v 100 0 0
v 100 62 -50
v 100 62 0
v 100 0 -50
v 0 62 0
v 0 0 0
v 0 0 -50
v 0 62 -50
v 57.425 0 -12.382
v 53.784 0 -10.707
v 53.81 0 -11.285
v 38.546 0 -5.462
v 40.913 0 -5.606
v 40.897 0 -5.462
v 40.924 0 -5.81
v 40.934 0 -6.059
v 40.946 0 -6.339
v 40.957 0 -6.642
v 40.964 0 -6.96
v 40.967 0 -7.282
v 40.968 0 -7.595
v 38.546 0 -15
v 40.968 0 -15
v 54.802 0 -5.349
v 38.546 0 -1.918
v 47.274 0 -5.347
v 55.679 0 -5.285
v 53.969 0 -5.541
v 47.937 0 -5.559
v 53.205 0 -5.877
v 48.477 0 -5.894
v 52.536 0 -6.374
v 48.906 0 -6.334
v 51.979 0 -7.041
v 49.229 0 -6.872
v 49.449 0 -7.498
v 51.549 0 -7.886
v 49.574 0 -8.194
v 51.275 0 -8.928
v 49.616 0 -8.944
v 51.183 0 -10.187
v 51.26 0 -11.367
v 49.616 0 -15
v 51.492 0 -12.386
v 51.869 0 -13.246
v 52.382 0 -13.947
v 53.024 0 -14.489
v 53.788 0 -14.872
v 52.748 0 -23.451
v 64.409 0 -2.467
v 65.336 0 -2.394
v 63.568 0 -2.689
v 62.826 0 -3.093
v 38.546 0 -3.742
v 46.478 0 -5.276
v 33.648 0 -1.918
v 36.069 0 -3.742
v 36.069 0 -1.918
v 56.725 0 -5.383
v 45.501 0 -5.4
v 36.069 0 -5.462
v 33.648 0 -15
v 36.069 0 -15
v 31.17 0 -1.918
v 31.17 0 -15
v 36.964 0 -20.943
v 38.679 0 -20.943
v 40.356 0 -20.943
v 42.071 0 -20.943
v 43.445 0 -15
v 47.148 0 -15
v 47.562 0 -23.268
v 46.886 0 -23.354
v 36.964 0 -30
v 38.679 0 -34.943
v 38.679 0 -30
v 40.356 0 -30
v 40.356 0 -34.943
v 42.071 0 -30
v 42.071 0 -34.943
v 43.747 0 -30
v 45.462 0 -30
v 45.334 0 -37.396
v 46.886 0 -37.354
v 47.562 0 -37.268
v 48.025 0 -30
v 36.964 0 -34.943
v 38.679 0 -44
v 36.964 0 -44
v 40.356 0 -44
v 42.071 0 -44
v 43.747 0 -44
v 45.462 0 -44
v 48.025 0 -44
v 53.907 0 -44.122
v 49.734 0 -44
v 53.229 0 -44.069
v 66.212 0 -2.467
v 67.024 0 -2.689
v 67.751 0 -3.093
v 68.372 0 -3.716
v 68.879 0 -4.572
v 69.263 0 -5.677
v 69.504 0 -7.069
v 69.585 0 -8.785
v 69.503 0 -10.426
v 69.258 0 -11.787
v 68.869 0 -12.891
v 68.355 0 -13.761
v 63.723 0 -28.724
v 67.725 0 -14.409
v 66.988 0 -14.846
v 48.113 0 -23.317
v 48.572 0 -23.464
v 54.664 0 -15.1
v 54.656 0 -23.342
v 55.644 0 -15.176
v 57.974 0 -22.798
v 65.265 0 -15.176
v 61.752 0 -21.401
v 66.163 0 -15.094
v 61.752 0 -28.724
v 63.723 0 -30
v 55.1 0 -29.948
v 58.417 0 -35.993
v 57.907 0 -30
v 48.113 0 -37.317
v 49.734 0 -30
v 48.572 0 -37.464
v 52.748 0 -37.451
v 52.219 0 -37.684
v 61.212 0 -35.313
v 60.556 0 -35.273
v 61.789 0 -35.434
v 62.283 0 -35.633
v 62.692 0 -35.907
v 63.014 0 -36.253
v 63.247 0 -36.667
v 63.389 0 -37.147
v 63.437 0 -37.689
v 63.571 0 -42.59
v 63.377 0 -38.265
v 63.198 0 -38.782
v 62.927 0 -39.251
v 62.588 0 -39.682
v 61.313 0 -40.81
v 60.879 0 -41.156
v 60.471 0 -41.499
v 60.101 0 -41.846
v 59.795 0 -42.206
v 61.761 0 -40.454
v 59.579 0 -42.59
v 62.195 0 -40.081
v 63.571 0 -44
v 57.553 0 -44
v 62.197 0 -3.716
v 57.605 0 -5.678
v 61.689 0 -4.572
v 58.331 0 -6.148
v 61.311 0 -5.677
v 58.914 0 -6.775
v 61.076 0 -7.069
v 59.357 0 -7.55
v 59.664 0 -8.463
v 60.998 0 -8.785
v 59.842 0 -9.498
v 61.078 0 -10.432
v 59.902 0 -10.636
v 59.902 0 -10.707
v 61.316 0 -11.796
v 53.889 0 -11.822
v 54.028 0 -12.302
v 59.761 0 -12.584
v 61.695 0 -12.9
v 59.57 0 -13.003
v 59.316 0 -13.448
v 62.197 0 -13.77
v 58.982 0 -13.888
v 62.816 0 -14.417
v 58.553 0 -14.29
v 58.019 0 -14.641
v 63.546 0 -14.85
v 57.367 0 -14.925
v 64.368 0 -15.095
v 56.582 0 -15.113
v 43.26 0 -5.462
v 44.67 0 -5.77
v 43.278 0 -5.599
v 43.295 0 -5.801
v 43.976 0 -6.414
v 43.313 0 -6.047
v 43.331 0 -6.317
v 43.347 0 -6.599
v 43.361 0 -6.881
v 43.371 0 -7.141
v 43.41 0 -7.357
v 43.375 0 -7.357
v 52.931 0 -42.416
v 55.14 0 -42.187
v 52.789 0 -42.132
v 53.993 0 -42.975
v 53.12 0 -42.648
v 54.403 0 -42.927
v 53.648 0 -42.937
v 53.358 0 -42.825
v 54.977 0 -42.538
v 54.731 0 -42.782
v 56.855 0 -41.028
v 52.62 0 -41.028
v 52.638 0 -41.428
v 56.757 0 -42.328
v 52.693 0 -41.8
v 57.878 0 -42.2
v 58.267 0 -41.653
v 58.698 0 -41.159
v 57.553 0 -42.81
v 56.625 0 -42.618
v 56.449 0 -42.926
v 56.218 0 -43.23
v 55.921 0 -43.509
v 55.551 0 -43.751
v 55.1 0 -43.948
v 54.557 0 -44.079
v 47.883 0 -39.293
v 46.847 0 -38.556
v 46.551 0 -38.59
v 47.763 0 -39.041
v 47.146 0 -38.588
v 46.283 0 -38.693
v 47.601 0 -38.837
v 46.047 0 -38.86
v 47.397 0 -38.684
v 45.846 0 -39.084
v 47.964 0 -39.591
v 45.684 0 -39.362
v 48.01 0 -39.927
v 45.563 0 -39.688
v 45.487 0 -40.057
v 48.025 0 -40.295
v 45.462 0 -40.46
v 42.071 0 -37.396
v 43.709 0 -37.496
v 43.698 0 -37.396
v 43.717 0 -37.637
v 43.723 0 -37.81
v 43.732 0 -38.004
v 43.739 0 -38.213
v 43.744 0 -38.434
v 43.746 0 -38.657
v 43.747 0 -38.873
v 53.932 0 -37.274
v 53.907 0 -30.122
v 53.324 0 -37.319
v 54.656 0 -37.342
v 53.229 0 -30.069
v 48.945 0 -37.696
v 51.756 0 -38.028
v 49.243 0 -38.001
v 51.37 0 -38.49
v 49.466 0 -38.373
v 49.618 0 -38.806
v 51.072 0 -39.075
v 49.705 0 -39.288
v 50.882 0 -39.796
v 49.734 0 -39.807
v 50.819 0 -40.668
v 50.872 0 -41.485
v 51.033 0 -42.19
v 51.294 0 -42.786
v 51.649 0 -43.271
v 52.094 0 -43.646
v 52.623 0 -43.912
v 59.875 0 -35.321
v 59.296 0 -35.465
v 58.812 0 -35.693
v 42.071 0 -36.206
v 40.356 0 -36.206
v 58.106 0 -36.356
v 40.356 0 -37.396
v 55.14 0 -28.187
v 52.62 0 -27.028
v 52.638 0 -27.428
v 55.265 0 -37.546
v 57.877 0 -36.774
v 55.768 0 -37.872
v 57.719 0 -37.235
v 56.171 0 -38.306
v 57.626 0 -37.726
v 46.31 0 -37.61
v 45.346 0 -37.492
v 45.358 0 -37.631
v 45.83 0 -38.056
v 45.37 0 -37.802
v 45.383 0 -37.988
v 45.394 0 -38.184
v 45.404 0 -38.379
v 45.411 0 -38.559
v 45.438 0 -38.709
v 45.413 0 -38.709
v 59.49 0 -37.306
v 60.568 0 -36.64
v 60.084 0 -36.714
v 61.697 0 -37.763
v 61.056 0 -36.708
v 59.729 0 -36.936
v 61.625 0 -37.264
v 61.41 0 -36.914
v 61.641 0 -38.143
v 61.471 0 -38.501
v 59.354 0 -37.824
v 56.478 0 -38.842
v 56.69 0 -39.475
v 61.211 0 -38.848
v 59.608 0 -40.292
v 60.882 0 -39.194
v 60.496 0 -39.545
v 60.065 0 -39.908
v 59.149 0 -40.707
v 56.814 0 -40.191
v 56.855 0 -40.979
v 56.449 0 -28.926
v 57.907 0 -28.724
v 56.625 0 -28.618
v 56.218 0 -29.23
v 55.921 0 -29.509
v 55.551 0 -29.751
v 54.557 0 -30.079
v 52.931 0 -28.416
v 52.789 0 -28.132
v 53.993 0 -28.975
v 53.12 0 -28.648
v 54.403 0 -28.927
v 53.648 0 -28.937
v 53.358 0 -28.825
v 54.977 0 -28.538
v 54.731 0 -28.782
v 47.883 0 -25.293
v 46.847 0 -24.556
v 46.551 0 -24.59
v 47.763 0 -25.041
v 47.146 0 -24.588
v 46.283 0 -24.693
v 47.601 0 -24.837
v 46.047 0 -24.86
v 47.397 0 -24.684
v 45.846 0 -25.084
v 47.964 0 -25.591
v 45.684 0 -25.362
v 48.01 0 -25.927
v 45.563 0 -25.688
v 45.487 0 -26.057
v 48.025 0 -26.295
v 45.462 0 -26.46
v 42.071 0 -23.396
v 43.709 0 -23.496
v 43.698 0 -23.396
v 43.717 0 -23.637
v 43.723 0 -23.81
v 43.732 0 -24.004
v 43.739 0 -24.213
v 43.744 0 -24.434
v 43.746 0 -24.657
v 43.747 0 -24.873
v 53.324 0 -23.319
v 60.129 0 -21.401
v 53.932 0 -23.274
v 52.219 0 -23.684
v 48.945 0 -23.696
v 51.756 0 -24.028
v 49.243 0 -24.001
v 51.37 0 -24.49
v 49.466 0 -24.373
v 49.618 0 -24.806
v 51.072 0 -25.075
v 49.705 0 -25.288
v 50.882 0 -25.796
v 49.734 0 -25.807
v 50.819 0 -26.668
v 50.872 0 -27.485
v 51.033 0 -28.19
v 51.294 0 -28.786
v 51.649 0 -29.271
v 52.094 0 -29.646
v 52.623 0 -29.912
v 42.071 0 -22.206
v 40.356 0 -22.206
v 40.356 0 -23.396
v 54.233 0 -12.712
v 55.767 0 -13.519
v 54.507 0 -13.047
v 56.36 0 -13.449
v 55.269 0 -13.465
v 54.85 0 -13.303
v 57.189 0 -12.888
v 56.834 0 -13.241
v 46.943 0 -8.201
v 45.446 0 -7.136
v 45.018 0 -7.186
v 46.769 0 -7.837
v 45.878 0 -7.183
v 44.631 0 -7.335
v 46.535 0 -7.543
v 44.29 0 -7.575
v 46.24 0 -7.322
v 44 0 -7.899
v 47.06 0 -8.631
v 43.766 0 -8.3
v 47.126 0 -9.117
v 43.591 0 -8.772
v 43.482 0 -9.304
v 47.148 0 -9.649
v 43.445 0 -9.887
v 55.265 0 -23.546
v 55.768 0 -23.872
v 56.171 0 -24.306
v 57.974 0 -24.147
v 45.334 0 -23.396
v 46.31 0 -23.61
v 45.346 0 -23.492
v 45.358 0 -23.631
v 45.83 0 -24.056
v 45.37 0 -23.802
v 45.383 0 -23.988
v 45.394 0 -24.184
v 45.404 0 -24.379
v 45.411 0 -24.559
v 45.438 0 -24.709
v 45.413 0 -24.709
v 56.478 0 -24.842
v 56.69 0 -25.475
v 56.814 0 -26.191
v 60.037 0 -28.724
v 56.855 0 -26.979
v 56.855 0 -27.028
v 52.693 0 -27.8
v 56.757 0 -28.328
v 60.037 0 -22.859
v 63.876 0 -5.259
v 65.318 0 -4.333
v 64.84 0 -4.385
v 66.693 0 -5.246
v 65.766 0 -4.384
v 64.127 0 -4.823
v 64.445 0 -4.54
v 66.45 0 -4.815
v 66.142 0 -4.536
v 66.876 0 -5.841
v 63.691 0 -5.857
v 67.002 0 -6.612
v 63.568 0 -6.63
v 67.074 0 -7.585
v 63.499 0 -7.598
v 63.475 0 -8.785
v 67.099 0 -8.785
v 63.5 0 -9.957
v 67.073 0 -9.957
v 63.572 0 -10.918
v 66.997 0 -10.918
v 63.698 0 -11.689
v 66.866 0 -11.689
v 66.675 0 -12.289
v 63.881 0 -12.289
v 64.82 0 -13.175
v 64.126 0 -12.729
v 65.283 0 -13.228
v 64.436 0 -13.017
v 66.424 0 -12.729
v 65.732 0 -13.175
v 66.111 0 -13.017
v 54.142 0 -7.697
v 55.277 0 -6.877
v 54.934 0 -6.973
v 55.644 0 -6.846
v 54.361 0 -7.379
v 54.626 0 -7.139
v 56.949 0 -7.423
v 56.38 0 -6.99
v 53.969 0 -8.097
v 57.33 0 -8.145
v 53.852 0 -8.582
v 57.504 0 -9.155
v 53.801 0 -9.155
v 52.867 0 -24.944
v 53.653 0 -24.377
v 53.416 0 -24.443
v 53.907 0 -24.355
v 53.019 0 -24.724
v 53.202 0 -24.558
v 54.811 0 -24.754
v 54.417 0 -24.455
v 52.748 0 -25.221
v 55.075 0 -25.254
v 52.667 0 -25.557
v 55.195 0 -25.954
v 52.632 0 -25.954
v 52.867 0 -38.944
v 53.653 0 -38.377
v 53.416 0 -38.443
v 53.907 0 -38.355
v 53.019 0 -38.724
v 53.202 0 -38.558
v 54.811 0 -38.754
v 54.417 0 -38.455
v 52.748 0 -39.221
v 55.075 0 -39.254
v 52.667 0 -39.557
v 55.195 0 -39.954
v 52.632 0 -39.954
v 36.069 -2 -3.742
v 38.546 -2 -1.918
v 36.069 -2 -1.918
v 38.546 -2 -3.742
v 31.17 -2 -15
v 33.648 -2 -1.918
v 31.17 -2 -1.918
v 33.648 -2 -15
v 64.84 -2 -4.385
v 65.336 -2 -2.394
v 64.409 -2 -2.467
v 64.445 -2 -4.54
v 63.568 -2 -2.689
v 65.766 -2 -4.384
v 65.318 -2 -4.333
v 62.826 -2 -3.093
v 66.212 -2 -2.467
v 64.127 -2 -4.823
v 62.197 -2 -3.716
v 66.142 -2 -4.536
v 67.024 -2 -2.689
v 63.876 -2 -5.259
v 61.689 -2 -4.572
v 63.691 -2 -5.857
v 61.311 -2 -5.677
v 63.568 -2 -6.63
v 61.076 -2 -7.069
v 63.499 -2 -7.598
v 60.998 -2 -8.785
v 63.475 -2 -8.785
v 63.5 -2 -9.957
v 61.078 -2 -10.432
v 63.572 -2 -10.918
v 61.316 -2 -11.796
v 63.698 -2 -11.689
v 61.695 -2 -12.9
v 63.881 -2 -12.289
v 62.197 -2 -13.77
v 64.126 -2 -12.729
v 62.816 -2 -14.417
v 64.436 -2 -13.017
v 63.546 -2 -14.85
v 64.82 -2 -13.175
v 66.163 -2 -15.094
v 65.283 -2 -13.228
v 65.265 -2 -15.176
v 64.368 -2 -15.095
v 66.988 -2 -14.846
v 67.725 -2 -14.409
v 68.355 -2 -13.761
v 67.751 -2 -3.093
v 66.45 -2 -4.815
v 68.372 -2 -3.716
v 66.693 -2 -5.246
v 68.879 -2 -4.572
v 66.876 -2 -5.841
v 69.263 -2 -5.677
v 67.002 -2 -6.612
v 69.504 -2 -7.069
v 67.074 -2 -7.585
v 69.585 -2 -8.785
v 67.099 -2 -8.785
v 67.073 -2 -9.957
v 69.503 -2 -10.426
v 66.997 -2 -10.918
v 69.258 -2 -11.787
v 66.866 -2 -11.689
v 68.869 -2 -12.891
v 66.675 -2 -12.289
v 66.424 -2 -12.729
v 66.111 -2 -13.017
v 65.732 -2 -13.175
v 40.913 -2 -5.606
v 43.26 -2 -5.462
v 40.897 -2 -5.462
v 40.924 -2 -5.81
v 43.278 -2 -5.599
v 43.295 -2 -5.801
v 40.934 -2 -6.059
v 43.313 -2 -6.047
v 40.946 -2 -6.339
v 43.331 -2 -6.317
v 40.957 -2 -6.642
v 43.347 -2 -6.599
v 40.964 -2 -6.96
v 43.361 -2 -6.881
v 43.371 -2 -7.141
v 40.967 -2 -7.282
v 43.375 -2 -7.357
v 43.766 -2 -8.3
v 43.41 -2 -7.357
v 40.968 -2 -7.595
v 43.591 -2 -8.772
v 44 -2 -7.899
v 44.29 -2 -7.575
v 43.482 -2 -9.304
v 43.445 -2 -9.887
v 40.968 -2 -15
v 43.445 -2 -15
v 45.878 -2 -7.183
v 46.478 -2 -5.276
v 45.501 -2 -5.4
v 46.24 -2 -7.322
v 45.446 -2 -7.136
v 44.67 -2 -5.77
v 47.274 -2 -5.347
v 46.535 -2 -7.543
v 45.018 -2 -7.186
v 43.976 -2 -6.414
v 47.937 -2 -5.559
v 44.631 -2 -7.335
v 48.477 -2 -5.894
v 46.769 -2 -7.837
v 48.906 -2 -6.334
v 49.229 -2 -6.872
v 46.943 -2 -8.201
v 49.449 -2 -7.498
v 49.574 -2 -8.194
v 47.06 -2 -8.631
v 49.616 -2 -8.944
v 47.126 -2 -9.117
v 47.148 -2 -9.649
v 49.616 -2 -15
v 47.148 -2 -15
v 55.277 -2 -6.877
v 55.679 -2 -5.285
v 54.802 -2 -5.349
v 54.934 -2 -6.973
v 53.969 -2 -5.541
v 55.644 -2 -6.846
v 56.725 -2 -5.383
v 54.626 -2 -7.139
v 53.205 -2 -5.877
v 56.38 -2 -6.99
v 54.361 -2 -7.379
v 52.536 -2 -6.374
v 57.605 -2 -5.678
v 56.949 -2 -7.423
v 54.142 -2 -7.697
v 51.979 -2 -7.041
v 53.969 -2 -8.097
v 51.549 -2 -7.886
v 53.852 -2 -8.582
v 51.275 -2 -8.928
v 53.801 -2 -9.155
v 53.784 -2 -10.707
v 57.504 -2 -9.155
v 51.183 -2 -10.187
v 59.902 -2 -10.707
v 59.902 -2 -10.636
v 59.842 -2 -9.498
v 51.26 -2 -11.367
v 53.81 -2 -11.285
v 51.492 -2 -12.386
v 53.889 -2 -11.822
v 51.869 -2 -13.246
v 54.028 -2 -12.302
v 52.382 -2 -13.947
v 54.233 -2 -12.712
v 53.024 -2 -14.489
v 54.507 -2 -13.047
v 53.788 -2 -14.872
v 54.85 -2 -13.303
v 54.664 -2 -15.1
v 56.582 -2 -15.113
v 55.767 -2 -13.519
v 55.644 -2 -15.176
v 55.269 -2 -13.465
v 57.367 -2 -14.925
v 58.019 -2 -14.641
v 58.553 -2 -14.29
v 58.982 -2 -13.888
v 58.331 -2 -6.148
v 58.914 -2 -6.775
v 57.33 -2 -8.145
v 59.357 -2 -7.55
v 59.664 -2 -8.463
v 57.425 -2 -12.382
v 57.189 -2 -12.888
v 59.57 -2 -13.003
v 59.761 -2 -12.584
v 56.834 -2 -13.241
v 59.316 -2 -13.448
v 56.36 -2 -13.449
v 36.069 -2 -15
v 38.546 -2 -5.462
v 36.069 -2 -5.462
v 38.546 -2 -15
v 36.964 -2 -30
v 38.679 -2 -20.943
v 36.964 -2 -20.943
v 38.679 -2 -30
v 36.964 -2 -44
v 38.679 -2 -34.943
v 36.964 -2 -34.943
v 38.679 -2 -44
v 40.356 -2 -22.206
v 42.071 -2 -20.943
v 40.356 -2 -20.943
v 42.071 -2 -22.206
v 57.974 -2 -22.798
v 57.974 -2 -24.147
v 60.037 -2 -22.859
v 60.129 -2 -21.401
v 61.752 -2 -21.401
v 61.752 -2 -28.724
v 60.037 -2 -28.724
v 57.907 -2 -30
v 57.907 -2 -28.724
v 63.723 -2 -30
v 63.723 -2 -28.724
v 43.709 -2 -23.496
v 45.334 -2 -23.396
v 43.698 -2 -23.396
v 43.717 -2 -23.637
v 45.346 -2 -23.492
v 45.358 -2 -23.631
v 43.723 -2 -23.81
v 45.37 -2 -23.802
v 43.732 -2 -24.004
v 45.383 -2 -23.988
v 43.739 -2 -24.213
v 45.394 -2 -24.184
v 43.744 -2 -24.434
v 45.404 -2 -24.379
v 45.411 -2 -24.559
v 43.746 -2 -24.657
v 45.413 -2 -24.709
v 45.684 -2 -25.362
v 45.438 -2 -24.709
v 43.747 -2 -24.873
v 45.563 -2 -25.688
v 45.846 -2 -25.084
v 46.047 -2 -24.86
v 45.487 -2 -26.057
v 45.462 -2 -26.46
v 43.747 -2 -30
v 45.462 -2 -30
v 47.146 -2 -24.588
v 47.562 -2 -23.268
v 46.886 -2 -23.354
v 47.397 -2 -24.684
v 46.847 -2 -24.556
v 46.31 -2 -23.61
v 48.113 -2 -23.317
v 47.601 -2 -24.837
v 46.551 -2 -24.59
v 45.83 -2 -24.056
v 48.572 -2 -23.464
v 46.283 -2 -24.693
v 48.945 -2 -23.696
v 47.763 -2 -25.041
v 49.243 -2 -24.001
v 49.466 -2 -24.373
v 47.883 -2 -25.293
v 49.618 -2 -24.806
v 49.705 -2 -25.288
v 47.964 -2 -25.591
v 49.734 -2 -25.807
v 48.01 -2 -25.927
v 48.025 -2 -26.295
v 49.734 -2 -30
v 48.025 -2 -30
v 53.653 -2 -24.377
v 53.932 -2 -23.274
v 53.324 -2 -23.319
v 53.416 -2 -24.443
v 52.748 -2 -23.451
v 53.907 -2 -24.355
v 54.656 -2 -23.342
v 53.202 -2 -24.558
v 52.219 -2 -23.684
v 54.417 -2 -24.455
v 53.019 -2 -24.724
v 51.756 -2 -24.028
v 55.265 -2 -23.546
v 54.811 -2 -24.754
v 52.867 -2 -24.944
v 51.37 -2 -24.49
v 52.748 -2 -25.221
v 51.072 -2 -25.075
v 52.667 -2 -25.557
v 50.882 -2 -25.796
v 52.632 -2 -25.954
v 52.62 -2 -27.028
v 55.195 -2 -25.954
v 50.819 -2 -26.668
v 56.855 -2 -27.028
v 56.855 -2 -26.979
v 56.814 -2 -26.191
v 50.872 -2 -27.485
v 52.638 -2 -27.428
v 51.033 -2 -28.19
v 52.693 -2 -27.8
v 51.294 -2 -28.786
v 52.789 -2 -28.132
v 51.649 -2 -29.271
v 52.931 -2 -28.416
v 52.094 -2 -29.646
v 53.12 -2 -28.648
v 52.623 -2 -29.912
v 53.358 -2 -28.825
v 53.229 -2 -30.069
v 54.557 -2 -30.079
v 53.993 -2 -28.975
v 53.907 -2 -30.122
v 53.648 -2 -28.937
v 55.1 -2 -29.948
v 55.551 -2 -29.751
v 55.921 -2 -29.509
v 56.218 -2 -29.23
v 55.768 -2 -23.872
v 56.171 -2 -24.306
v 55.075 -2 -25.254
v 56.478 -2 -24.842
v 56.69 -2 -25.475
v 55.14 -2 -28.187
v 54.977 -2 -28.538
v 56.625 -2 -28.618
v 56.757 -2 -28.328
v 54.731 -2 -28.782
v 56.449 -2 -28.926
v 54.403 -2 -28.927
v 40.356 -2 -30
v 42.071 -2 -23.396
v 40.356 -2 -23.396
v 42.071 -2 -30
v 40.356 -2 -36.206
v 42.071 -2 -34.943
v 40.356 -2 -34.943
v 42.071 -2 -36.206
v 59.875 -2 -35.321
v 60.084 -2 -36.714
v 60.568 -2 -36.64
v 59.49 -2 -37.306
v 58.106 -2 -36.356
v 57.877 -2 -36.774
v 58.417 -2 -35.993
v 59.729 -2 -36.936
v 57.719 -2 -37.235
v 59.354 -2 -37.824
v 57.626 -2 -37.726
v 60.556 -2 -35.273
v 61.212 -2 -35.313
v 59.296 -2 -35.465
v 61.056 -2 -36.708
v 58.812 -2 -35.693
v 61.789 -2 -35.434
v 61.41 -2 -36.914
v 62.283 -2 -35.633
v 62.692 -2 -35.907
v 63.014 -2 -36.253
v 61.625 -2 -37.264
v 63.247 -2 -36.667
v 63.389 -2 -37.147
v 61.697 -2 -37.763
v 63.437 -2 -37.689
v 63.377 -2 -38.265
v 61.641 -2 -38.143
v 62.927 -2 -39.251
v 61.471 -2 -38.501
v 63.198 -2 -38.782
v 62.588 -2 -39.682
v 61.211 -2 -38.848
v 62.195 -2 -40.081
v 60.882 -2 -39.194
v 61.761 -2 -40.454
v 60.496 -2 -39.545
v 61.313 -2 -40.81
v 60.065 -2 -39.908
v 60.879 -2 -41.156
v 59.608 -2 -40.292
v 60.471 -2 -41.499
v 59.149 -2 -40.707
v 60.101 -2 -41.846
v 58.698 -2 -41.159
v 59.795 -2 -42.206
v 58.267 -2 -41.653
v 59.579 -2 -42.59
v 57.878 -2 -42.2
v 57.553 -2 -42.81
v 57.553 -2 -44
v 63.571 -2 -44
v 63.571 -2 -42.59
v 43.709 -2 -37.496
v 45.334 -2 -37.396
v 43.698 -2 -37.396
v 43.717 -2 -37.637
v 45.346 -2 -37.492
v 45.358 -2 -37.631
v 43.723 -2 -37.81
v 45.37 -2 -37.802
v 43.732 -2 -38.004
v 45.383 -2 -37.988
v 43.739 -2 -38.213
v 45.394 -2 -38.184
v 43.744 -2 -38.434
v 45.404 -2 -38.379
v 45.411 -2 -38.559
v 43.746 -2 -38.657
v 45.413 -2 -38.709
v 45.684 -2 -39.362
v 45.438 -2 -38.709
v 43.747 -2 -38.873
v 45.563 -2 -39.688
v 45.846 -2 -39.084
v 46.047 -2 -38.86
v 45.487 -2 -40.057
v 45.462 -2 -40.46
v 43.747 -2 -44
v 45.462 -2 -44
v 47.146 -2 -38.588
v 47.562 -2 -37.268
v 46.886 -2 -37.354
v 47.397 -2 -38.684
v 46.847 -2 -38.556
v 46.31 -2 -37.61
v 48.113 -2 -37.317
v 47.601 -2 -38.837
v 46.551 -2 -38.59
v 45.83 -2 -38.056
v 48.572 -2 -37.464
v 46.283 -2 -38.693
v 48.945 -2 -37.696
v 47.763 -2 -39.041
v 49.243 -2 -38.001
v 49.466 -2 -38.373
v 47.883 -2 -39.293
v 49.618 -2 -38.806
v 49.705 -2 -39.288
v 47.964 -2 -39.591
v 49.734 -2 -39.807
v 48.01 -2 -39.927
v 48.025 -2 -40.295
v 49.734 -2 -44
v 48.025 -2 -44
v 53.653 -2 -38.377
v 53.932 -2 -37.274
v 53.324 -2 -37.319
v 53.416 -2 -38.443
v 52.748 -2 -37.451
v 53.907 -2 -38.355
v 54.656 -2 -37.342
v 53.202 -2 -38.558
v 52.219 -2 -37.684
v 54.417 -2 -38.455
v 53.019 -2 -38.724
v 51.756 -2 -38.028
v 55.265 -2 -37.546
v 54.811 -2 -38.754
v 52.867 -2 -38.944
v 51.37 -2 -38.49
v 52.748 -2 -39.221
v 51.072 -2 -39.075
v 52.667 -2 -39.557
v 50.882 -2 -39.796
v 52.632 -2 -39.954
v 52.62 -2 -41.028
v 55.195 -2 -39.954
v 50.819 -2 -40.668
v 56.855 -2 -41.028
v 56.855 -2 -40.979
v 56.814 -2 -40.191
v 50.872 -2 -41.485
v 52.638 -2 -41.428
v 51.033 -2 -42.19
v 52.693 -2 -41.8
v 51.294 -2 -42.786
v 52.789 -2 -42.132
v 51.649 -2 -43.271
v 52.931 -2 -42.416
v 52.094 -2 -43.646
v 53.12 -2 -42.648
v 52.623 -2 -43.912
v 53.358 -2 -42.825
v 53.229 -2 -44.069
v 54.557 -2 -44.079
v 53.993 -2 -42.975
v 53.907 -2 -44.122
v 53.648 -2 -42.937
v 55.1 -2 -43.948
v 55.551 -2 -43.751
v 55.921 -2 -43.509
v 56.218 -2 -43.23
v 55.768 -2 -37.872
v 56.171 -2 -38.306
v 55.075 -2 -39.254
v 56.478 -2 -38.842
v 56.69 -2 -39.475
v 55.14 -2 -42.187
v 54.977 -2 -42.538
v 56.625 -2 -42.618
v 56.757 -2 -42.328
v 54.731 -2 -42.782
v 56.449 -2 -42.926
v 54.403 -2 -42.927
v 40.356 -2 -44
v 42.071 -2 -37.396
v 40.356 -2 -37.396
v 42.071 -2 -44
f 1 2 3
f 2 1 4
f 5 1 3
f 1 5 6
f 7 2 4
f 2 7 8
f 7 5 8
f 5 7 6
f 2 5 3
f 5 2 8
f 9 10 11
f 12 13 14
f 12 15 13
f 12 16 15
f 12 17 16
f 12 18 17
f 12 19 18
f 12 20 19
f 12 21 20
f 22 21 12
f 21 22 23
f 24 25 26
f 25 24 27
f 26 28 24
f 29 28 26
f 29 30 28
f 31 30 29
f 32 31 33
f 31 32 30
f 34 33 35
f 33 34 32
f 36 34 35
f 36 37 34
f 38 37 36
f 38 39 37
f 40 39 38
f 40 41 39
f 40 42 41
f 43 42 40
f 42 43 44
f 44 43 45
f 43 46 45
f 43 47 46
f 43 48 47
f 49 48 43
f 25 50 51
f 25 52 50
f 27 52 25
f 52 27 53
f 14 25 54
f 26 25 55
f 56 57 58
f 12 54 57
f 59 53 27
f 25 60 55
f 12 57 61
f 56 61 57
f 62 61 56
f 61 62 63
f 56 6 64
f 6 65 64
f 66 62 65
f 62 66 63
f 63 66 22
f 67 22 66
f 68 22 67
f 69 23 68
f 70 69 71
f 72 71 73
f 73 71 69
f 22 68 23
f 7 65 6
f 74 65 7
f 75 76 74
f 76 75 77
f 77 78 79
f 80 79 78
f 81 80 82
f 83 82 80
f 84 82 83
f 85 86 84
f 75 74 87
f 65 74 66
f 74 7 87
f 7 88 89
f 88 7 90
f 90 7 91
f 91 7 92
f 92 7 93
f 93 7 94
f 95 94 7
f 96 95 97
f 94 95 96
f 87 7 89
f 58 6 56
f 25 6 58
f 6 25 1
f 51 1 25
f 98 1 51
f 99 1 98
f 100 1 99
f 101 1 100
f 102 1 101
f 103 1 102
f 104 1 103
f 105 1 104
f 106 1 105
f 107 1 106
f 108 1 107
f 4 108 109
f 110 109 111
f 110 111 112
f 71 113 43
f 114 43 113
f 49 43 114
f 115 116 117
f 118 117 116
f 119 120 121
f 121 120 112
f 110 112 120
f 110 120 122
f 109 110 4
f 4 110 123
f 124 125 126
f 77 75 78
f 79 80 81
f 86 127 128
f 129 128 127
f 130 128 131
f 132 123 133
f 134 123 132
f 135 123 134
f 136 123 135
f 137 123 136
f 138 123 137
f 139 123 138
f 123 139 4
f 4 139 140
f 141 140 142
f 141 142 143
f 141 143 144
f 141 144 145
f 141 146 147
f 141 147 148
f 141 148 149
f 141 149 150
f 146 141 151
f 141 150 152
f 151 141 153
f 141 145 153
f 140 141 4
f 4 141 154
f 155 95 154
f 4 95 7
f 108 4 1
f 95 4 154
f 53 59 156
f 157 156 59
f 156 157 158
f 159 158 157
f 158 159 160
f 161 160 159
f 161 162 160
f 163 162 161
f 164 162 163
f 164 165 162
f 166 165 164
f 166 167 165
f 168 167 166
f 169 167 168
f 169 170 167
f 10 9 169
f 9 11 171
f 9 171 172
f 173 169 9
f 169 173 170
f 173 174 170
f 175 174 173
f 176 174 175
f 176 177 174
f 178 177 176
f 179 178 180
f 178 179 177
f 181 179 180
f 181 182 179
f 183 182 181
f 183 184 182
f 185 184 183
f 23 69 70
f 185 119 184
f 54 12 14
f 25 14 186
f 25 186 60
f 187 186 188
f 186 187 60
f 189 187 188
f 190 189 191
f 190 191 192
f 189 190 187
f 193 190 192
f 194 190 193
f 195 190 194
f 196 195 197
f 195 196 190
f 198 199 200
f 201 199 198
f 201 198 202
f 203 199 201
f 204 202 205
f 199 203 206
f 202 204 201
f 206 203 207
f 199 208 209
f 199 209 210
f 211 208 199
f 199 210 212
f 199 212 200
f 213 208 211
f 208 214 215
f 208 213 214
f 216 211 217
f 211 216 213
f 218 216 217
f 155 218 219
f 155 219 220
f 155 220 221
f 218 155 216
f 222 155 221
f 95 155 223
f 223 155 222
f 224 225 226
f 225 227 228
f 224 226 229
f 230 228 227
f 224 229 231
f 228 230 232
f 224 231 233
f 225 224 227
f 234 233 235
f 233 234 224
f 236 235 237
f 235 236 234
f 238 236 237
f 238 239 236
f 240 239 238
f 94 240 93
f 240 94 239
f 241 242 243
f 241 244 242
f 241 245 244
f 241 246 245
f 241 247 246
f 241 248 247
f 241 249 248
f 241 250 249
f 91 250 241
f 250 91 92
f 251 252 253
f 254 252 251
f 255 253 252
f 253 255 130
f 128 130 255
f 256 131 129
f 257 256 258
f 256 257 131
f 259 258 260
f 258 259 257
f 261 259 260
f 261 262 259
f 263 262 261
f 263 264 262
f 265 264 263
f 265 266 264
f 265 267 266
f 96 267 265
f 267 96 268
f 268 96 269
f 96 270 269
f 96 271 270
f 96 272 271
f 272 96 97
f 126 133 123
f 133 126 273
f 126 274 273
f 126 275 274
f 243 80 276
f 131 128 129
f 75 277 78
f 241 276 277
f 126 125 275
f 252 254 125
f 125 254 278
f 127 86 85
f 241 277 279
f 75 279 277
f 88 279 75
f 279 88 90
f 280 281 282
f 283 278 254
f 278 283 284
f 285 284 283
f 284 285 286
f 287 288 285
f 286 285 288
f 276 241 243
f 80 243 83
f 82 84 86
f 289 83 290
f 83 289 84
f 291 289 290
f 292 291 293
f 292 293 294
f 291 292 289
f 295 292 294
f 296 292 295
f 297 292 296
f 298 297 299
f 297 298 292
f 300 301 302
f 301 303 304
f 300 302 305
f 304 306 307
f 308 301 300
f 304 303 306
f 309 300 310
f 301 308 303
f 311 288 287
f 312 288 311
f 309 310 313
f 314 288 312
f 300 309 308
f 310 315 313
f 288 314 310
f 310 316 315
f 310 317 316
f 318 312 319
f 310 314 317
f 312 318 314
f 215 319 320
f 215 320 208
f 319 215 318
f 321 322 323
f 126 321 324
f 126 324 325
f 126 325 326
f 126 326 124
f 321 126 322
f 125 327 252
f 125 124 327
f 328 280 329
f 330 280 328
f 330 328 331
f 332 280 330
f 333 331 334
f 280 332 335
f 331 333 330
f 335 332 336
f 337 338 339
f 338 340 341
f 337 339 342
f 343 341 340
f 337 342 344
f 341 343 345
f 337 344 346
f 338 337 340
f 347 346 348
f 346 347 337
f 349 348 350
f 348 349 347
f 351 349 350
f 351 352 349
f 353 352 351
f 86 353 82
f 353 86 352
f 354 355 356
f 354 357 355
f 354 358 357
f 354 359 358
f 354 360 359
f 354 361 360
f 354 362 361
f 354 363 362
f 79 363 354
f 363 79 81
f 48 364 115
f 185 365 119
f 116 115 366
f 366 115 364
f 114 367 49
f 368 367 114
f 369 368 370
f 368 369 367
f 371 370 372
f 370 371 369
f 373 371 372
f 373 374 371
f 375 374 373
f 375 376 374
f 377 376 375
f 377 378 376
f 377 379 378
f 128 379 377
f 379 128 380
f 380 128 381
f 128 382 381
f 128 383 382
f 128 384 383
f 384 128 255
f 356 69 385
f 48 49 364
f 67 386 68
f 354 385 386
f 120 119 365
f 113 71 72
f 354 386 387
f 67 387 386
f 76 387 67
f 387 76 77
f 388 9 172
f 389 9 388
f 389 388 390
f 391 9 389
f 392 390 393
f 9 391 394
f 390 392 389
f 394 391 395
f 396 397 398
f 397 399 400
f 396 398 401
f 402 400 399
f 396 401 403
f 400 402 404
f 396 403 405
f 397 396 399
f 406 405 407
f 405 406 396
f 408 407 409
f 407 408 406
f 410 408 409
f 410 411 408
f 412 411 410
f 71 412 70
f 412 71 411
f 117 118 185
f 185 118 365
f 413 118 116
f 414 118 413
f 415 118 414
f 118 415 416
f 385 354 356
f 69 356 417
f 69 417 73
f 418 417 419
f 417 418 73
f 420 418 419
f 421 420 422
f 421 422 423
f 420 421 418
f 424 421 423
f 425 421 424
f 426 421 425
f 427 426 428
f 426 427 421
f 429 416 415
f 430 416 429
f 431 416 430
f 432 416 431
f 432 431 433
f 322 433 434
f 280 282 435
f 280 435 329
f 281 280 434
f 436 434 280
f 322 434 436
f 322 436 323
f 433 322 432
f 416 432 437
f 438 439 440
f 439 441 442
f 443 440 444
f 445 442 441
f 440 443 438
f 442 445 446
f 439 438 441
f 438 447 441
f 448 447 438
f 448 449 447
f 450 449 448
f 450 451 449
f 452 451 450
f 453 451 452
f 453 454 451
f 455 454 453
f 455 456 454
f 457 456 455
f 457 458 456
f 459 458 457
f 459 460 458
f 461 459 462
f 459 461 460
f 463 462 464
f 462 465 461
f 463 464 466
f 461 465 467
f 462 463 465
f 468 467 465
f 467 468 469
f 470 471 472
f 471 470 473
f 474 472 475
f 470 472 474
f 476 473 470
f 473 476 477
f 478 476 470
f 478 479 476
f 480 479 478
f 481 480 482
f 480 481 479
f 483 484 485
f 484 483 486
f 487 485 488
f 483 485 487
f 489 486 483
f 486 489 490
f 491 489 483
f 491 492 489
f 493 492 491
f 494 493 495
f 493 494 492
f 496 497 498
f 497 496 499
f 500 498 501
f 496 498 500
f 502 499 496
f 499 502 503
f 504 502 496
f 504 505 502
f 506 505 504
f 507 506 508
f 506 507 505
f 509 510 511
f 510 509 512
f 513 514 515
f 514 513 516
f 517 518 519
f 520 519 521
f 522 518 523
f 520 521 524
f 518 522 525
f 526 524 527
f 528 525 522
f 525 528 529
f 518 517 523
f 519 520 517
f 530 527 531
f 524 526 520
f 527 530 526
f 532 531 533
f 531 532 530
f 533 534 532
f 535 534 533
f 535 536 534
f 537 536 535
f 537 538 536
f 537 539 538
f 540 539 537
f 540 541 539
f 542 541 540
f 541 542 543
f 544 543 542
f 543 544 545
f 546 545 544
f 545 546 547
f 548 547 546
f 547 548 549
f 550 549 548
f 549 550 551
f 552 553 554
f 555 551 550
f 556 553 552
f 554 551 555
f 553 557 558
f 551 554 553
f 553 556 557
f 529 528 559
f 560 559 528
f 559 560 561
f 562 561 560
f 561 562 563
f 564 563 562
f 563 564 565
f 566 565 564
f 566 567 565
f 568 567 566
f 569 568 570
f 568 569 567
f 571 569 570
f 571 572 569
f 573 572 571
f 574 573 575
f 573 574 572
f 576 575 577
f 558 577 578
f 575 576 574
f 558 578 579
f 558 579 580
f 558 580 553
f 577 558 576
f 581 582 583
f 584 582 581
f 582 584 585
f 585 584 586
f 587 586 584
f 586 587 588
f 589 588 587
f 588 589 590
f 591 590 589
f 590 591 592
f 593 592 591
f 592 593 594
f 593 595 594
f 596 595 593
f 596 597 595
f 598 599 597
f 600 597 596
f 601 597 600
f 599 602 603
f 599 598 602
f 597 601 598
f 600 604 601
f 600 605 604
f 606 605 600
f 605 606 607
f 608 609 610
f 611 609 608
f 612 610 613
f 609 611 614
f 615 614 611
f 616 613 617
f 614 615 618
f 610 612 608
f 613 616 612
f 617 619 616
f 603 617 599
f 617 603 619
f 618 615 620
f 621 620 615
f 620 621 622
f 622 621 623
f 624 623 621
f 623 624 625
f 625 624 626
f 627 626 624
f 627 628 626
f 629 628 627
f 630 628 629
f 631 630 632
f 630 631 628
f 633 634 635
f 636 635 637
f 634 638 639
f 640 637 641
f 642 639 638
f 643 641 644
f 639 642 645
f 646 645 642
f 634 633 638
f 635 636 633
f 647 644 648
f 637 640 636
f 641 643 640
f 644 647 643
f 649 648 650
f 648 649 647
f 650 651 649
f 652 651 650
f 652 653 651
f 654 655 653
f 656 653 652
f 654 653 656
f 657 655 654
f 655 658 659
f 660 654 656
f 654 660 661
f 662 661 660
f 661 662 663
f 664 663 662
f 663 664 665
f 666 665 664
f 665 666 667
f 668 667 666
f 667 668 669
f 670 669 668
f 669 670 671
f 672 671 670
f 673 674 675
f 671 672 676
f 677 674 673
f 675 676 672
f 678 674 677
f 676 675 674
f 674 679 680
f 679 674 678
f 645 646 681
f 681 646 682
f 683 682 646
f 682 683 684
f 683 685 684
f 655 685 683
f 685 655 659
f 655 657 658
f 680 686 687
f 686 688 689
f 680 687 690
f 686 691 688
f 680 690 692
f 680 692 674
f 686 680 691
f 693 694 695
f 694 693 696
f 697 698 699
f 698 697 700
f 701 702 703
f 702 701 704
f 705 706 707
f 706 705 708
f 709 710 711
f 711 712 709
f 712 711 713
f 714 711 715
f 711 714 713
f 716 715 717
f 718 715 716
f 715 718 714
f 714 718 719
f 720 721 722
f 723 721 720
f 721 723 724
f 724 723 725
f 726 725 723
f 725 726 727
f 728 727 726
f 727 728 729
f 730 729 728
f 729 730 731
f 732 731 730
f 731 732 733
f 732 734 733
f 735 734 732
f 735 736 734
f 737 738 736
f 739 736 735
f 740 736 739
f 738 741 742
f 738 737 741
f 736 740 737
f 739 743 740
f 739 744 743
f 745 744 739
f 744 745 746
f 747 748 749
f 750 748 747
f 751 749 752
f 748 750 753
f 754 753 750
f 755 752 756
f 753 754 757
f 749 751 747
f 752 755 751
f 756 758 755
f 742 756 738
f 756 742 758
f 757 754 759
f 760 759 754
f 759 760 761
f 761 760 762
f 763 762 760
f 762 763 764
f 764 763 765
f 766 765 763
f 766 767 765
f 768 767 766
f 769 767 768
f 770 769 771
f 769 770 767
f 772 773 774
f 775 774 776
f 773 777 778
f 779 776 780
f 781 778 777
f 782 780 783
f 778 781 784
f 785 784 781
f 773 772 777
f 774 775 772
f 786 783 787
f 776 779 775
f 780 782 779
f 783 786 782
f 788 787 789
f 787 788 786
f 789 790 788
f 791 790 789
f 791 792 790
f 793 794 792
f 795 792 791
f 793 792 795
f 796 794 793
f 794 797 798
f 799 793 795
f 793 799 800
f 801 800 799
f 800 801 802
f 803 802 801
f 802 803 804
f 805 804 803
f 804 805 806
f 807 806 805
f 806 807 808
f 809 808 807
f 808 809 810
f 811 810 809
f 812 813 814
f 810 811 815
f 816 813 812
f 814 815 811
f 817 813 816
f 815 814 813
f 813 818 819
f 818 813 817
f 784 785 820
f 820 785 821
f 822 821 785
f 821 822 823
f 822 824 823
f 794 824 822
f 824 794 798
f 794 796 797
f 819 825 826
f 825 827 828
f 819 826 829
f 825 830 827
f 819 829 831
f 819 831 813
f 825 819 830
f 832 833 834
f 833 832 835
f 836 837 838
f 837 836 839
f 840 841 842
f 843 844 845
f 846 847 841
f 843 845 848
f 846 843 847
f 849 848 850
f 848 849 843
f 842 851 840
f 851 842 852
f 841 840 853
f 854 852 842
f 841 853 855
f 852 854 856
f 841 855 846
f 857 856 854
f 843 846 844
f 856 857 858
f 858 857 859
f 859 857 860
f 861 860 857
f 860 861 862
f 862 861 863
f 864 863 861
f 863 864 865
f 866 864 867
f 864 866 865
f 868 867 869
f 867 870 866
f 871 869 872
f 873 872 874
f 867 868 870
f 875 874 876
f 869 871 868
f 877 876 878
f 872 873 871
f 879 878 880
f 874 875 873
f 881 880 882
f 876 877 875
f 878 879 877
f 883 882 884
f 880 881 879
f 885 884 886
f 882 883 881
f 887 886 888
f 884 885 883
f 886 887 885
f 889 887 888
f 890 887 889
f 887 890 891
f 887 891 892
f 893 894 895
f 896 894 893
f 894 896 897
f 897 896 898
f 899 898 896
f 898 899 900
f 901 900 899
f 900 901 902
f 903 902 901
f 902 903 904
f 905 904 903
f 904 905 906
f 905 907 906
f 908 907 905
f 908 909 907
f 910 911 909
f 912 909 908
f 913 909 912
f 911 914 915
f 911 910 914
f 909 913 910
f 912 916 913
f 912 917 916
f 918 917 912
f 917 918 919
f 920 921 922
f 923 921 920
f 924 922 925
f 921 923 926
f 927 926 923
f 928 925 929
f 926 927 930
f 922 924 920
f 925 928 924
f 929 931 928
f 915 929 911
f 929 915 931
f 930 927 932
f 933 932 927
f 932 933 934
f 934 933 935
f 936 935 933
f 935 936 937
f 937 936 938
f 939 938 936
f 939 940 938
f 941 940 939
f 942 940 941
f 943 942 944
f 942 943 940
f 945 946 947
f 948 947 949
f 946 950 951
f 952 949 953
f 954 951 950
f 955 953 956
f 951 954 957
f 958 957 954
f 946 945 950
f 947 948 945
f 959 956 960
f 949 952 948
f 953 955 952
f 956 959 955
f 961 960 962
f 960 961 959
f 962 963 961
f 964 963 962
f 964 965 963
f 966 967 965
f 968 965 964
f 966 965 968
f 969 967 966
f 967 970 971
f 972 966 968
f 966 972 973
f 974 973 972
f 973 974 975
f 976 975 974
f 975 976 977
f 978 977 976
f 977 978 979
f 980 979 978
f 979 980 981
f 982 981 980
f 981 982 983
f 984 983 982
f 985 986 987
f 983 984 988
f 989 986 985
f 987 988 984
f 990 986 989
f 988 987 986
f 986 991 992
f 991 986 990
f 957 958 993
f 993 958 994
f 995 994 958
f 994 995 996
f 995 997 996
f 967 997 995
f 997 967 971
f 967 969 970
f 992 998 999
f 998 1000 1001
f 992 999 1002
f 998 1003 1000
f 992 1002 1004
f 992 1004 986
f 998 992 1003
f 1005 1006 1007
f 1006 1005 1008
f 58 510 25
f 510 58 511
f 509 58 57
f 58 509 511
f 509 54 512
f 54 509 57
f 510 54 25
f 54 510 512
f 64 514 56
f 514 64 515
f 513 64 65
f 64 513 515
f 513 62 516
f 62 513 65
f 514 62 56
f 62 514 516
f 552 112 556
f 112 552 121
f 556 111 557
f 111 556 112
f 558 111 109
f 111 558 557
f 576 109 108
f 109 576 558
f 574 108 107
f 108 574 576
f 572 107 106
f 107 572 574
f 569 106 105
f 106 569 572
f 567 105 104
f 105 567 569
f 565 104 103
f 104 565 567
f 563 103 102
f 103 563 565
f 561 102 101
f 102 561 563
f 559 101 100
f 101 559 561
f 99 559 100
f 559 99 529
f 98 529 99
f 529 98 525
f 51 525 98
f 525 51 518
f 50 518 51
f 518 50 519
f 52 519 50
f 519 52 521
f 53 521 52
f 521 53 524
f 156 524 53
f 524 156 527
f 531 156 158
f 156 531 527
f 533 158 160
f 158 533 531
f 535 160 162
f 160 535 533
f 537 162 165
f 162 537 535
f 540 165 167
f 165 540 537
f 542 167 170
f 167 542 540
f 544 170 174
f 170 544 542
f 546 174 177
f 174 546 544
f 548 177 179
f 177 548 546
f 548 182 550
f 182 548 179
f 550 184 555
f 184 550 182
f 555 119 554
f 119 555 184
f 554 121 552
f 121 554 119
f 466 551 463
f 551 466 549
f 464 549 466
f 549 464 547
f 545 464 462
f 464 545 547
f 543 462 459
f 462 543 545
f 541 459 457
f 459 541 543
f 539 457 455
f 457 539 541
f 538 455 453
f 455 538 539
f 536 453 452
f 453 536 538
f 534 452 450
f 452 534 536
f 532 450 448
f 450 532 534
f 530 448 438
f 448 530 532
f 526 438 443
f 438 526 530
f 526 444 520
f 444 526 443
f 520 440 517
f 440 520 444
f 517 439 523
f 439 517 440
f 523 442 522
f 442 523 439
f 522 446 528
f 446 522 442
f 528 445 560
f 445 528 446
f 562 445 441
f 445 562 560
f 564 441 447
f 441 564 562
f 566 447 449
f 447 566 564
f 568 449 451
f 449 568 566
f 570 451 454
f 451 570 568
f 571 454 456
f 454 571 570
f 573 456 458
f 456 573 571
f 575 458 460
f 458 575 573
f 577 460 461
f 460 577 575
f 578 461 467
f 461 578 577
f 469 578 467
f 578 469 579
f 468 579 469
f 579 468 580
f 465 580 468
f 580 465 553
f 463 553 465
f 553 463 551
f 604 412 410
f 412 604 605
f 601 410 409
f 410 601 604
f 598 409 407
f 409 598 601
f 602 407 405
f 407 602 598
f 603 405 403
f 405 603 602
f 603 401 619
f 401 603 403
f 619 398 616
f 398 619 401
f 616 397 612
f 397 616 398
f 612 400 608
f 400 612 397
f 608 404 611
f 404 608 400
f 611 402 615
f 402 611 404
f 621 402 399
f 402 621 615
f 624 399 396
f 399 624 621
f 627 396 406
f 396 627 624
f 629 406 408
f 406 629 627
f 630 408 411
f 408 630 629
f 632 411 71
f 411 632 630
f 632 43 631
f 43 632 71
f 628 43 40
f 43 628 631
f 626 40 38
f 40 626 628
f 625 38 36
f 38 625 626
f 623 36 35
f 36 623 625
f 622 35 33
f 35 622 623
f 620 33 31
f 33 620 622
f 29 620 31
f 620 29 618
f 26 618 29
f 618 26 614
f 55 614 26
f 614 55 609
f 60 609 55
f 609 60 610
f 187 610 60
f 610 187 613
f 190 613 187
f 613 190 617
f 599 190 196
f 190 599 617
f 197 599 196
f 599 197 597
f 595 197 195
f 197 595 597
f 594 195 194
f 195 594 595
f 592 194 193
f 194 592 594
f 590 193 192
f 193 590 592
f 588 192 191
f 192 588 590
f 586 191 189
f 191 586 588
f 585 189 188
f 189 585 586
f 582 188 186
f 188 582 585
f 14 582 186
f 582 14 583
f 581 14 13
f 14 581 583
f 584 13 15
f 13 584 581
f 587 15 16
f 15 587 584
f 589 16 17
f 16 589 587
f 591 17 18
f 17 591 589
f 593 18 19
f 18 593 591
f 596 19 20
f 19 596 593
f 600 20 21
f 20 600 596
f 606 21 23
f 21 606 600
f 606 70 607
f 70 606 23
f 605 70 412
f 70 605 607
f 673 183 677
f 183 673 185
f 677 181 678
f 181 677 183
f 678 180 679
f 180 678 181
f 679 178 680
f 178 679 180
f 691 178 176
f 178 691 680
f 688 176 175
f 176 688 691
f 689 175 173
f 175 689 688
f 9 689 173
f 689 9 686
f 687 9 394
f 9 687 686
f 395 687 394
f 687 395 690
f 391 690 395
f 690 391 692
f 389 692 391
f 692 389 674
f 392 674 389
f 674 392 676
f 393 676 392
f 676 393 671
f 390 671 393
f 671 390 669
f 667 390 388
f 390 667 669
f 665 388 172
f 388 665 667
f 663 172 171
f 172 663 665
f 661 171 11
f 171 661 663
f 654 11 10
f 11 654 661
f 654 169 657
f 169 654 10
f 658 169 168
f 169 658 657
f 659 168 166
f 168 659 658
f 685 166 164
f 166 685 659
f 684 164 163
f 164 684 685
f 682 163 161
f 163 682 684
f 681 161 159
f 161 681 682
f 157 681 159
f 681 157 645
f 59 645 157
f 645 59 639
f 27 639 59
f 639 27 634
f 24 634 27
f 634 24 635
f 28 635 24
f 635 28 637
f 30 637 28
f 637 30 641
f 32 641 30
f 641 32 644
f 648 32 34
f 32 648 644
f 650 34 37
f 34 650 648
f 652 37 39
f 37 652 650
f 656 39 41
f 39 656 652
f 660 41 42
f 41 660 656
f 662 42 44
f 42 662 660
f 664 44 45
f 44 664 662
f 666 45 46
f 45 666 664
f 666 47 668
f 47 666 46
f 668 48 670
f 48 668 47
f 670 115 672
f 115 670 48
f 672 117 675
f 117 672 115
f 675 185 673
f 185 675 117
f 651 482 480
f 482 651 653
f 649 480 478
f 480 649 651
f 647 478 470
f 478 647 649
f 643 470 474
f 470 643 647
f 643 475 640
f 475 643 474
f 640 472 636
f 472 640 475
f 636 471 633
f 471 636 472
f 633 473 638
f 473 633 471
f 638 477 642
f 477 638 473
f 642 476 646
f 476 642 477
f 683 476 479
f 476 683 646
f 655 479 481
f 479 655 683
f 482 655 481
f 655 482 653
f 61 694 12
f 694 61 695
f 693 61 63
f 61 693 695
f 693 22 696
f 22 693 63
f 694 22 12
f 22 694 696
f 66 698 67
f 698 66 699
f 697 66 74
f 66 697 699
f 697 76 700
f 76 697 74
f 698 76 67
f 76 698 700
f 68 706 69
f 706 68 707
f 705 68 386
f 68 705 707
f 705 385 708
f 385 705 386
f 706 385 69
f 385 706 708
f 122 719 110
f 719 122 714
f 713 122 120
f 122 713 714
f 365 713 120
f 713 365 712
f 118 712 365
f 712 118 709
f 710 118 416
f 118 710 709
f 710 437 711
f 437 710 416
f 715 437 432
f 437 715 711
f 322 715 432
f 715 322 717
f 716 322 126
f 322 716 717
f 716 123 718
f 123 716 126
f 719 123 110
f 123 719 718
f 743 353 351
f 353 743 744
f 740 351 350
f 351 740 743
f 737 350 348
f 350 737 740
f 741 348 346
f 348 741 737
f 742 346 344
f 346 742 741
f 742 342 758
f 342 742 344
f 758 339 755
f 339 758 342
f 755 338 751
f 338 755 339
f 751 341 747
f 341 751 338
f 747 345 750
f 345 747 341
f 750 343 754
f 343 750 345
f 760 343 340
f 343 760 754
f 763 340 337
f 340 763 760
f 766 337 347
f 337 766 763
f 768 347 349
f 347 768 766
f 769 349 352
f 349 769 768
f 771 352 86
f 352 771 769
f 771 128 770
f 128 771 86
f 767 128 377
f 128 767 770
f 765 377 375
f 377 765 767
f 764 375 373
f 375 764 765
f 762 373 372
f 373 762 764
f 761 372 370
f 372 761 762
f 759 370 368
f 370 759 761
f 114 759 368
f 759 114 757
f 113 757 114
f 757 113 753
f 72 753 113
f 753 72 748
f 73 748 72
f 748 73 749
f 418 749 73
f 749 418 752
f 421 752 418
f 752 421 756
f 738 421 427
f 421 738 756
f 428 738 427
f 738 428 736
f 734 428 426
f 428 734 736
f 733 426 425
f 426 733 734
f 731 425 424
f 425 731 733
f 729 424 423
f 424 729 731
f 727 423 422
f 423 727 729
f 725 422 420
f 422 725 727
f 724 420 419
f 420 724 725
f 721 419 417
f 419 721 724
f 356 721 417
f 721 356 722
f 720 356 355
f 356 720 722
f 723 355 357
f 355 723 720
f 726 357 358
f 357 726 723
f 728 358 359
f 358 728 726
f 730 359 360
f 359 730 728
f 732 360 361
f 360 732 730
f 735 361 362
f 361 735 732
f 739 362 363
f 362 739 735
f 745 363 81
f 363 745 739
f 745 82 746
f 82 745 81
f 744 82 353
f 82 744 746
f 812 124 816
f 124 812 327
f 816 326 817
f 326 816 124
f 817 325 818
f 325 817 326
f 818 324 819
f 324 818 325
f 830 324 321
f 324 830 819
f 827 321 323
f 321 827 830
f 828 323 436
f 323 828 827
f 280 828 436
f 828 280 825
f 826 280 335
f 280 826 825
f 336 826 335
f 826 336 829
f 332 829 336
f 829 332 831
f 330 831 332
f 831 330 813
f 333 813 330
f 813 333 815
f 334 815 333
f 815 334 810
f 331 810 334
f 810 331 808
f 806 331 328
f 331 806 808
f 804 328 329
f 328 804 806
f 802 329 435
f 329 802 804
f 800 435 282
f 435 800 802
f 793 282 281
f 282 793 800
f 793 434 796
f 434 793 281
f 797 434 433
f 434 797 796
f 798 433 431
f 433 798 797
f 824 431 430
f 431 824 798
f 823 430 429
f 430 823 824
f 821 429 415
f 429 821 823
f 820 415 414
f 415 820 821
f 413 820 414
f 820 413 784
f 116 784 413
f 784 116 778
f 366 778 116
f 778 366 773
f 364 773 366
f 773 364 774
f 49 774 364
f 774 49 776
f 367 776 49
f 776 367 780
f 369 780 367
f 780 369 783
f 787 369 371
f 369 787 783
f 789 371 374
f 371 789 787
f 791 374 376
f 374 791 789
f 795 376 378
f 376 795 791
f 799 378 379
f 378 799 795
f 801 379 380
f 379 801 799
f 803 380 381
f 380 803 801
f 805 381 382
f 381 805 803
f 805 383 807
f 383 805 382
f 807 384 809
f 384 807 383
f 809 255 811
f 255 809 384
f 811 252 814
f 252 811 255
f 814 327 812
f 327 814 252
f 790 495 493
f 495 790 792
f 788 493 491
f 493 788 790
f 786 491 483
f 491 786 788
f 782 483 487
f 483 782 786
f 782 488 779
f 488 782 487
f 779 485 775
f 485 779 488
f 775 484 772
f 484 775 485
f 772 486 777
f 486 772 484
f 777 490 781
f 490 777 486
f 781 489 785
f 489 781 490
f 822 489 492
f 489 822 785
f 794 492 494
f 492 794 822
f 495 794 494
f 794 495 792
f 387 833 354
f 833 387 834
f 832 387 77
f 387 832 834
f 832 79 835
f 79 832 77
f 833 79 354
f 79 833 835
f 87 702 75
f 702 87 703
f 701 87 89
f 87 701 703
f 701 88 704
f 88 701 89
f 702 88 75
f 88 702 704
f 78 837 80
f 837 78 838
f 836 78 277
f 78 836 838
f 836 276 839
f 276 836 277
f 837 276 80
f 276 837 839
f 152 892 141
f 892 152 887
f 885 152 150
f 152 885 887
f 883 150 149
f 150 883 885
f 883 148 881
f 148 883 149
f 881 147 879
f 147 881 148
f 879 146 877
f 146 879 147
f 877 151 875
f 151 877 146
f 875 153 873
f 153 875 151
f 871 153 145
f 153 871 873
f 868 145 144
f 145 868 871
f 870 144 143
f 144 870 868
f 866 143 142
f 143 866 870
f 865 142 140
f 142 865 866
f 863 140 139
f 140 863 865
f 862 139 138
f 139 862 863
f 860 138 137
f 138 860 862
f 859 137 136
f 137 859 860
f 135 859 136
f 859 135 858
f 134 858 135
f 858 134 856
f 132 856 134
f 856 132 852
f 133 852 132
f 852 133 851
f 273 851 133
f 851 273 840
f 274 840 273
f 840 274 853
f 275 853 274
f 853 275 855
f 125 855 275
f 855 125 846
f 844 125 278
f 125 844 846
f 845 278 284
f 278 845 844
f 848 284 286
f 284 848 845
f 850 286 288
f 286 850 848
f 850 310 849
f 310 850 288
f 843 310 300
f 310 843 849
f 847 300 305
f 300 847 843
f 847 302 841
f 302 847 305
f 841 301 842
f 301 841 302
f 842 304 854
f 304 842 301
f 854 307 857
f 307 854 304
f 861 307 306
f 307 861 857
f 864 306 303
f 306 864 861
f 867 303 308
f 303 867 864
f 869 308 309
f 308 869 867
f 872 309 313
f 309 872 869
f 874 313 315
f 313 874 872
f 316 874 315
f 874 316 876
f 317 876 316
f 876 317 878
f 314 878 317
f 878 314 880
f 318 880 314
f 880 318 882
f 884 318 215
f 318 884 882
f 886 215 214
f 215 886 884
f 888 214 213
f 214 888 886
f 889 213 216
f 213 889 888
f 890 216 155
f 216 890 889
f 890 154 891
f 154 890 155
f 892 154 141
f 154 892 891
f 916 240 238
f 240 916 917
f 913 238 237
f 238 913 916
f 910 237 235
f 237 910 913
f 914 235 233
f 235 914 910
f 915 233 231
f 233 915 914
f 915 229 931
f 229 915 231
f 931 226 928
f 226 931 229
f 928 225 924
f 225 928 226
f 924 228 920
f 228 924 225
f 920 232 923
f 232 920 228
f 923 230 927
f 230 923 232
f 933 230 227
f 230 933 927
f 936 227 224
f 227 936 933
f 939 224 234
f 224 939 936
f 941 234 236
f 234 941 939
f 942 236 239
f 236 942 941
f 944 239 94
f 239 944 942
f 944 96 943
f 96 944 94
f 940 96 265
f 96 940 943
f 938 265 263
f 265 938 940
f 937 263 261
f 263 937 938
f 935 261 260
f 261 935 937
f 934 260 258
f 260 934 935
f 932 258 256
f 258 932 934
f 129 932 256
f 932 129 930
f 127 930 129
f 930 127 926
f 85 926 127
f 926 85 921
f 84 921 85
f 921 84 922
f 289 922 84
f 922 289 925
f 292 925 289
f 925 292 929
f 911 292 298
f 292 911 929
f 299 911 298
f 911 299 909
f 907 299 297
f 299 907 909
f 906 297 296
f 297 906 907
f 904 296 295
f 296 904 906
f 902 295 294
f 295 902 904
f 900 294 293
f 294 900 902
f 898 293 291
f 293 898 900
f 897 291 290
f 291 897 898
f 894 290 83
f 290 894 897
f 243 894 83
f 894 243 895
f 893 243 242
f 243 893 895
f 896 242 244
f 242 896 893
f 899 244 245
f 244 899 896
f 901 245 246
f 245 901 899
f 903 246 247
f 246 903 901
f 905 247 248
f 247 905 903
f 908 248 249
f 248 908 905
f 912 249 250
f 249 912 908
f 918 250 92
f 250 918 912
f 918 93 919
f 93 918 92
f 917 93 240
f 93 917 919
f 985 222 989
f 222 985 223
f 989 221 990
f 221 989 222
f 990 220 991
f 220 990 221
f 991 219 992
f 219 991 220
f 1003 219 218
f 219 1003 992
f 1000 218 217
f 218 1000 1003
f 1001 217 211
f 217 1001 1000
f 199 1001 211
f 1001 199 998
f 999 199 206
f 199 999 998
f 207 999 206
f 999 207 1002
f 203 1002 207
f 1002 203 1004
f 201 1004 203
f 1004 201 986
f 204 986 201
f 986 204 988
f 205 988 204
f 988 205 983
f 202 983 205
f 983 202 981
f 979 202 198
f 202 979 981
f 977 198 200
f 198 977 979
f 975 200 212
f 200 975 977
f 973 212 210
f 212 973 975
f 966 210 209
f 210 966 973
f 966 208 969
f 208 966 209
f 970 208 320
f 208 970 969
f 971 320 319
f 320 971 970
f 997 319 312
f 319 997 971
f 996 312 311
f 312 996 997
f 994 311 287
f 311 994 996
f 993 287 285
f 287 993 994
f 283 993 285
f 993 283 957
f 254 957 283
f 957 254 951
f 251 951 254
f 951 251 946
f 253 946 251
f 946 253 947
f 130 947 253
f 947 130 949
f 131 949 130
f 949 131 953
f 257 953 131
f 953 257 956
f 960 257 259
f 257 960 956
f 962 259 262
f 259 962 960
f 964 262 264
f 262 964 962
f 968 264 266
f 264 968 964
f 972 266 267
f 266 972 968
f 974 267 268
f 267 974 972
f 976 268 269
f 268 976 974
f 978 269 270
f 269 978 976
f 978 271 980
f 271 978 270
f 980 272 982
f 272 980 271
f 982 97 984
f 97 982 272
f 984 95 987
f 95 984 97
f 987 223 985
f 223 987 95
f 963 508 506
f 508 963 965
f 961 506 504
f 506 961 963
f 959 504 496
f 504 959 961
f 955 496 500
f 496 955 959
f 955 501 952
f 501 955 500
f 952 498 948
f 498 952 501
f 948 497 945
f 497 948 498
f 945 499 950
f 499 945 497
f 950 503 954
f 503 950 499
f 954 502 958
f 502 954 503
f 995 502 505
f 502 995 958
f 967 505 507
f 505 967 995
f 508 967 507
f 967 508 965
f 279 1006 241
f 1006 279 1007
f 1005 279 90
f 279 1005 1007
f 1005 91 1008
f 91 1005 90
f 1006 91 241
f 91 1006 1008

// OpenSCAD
/* [text] */
line0 = "line0";
line1 = "line1";
line2 = "line2";

/* [resolution] */
// resolution
$fn = 10;

/* [Animation] */
// rotating animation
animation_rotation = false;

/* [Hidden] */
is_animated = animation_rotation;
$vpt = is_animated ? [50, 30, 0] : $vpt;
$vpr = is_animated ? [60, 0, animation_rotation ? (365 * $t) : 45] : $vpr; // animation rotate around the object
$vpd = is_animated ? 400 : $vpd;

award([line0, line1, line2]);

module award(lines) {
  color("white")
    translate([0, 0, -50])
      cube([100, 62, 50]);
  color("white")
    mont_rose();
  color("blue")
    utmr_text(lines);
}

module utmr_text(lines) {
  translate([50, 0, 0]) {
    rotate([90, 0, 0]) {
      linear_extrude(2) {
        translate([0, -15])
          text(lines[0], size = 13, font = "Liberation Sans:style=Bold", halign = "center");
        translate([0, -30])
          text(lines[1], size = 9, font = "Liberation Sans:style=Bold", halign = "center");
        translate([0, -44])
          text(lines[2], size = 9, font = "Liberation Sans:style=Bold", halign = "center");
      }
    }
  }
}

module mont_rose() {
  import("./mont_rose.3mf");
}
